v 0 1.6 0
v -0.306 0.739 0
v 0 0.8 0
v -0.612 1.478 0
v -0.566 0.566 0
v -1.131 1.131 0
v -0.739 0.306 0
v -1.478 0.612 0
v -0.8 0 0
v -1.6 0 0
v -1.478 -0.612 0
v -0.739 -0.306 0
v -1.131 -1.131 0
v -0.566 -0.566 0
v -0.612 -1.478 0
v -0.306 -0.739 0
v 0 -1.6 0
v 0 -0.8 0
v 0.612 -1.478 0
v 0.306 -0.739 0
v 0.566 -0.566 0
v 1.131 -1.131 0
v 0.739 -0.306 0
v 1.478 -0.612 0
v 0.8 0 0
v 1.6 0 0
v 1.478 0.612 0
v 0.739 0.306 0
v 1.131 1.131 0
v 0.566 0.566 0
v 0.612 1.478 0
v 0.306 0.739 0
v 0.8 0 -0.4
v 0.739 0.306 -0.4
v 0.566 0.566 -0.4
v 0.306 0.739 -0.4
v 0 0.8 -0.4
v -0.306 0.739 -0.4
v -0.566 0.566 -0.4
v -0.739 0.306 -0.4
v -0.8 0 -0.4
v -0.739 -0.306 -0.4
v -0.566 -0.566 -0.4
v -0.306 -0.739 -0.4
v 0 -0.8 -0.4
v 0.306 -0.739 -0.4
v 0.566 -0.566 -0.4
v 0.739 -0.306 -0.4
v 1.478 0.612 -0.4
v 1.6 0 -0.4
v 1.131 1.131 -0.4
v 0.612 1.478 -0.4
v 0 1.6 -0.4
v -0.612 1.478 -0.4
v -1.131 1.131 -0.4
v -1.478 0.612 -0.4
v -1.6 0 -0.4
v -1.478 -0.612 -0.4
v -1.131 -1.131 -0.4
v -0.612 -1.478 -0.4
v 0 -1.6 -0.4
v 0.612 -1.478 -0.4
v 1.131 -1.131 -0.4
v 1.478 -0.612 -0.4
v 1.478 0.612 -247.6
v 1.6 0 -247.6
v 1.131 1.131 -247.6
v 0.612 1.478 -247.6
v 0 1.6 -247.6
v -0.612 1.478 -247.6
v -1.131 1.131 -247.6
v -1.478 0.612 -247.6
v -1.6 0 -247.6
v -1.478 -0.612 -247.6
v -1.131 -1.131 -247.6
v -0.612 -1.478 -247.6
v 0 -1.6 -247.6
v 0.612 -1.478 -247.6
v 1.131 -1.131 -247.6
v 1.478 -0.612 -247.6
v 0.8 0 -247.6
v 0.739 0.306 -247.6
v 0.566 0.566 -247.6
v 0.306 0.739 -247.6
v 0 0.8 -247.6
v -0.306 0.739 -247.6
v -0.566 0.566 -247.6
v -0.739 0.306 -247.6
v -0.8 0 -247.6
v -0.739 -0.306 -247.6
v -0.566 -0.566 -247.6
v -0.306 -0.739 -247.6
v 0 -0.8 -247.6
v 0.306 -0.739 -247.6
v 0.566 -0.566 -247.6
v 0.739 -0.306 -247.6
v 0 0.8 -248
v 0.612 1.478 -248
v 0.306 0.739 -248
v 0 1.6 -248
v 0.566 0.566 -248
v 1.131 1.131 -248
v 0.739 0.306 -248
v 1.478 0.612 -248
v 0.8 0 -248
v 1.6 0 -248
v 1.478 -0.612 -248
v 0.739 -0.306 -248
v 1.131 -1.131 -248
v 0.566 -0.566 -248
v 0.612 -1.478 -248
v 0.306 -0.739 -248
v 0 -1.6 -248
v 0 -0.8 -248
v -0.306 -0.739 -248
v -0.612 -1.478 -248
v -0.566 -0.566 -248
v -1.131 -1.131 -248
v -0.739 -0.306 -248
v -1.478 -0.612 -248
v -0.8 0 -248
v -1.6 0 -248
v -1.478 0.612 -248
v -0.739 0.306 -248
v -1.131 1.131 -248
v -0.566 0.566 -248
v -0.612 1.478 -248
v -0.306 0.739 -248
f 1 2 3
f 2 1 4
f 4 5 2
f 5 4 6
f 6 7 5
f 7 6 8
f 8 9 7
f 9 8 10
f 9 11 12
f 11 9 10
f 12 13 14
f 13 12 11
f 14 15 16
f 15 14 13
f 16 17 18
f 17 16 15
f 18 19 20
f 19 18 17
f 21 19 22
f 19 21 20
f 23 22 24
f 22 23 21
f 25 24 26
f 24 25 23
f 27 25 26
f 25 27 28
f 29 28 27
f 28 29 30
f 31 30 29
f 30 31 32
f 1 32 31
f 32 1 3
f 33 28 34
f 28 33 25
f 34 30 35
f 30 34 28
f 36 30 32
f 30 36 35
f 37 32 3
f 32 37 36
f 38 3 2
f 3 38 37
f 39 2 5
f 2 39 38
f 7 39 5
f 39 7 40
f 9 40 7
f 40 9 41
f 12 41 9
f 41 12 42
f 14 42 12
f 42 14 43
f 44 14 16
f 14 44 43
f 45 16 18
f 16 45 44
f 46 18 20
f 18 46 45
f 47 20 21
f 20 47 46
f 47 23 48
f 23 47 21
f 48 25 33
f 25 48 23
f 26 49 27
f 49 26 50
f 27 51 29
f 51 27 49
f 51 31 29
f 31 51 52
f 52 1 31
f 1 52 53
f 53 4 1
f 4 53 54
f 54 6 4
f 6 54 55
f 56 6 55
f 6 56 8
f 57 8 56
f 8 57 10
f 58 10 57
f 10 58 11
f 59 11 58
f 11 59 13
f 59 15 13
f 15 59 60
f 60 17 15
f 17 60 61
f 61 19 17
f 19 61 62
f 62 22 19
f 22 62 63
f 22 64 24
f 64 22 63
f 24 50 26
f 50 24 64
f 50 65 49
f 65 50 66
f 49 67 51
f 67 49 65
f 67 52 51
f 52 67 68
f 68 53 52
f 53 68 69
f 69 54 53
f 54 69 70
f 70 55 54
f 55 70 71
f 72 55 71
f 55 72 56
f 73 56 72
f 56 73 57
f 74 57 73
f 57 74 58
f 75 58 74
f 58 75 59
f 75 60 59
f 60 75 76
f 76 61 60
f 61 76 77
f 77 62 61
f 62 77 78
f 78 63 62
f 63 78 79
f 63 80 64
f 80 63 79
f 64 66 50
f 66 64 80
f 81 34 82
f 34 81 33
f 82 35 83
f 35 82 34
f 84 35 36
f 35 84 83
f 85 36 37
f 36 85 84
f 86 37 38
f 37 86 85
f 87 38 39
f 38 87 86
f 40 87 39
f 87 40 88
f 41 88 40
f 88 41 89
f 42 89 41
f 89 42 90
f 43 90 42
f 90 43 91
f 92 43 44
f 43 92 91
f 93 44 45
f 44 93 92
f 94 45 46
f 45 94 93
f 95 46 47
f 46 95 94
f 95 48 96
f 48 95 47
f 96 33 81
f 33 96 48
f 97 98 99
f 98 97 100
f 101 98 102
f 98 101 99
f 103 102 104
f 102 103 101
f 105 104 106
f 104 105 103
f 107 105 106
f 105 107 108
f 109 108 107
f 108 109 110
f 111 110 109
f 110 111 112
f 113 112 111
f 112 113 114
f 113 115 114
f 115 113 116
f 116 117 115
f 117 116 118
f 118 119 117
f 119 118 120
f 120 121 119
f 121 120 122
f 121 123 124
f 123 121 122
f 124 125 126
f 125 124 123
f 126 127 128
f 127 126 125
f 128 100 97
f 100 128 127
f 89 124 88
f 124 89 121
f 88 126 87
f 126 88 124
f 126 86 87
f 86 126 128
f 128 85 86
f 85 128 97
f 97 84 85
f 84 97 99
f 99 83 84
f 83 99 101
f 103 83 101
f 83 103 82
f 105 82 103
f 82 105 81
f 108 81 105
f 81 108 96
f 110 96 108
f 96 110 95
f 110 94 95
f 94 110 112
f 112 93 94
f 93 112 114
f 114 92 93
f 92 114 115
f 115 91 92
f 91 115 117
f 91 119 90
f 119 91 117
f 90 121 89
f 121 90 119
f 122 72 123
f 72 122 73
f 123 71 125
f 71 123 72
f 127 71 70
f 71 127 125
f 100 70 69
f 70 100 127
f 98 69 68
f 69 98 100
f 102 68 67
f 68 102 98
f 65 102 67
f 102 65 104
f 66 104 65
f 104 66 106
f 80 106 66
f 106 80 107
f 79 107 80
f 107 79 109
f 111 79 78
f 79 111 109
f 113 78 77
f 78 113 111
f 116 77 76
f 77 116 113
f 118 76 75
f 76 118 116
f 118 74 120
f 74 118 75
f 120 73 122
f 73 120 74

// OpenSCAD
// file: ../p/4-4ring1.scad
use <../lib.scad>
function ldraw_lib__4_4ring1() = [
// 0 Ring  1 x 1.0
// 0 Name: 4-4ring1.dat
// 0 Author: James Jessiman
// 0 !LDRAW_ORG Primitive UPDATE 2009-01
// 0 !LICENSE Licensed under CC BY 2.0 and CC BY 4.0 : see CAreadme.txt
// 
// 0 BFC CERTIFY CCW
  [0,"BFC","CERTIFY"],
  [0,"BFC","CCW"],
// 
// 0 !HISTORY 1998-12-15 [PTadmin] Official Update 1998-10
// 0 !HISTORY 2002-04-08 [BrickCaster] Modified for BFC compliance
// 0 !HISTORY 2002-04-25 [PTadmin] Official Update 2002-02
// 0 !HISTORY 2007-06-24 [PTadmin] Header formatted for Contributor Agreement
// 0 !HISTORY 2008-07-01 [PTadmin] Official Update 2008-01
// 0 !HISTORY 2008-08-26 [cwdee] Switch polygon winding and rename
// 0 !HISTORY 2009-05-02 [PTadmin] Official Update 2009-01
// 
// 
// 4 16 -0.7654 0 1.8478 -0.3827 0 0.9239 0 0 1 0 0 2
  [4,16,-0.7654,0,1.8478,-0.3827,0,0.9239,0,0,1,0,0,2],
// 4 16 -1.4142 0 1.4142 -0.7071 0 0.7071 -0.3827 0 0.9239 -0.7654 0 1.8478
  [4,16,-1.4142,0,1.4142,-0.7071,0,0.7071,-0.3827,0,0.9239,-0.7654,0,1.8478],
// 4 16 -1.8478 0 0.7654 -0.9239 0 0.3827 -0.7071 0 0.7071 -1.4142 0 1.41420
  [4,16,-1.8478,0,0.7654,-0.9239,0,0.3827,-0.7071,0,0.7071,-1.4142,0,1.41420],
// 4 16 -2 0 0 -1 0 0 -0.9239 0 0.3827 -1.8478 0 0.7654
  [4,16,-2,0,0,-1,0,0,-0.9239,0,0.3827,-1.8478,0,0.7654],
// 4 16 -1.8478 0 -0.7654 -0.9239 0 -0.3827 -1 0 0 -2 0 0
  [4,16,-1.8478,0,-0.7654,-0.9239,0,-0.3827,-1,0,0,-2,0,0],
// 4 16 -1.4142 0 -1.4142 -0.7071 0 -0.7071 -0.9239 0 -0.3827 -1.8478 0 -0.7654
  [4,16,-1.4142,0,-1.4142,-0.7071,0,-0.7071,-0.9239,0,-0.3827,-1.8478,0,-0.7654],
// 4 16 -0.7654 0 -1.8478 -0.3827 0 -0.9239 -0.7071 0 -0.7071 -1.4142 0 -1.4142
  [4,16,-0.7654,0,-1.8478,-0.3827,0,-0.9239,-0.7071,0,-0.7071,-1.4142,0,-1.4142],
// 4 16 0 0 -2 0 0 -1 -0.3827 0 -0.9239 -0.7654 0 -1.8478
  [4,16,0,0,-2,0,0,-1,-0.3827,0,-0.9239,-0.7654,0,-1.8478],
// 4 16 0.7654 0 -1.8478 0.3827 0 -0.9239 0 0 -1 0 0 -2
  [4,16,0.7654,0,-1.8478,0.3827,0,-0.9239,0,0,-1,0,0,-2],
// 4 16 1.4142 0 -1.4142 0.7071 0 -0.7071 0.3827 0 -0.9239 0.7654 0 -1.8478
  [4,16,1.4142,0,-1.4142,0.7071,0,-0.7071,0.3827,0,-0.9239,0.7654,0,-1.8478],
// 4 16 1.8478 0 -0.7654 0.9239 0 -0.3827 0.7071 0 -0.7071 1.4142 0 -1.4142
  [4,16,1.8478,0,-0.7654,0.9239,0,-0.3827,0.7071,0,-0.7071,1.4142,0,-1.4142],
// 4 16 2 0 0 1 0 0 0.9239 0 -0.3827 1.8478 0 -0.7654
  [4,16,2,0,0,1,0,0,0.9239,0,-0.3827,1.8478,0,-0.7654],
// 4 16 1.8478 0 0.7654 0.9239 0 0.3827 1 0 0 2 0 0
  [4,16,1.8478,0,0.7654,0.9239,0,0.3827,1,0,0,2,0,0],
// 4 16 1.4142 0 1.4142 0.7071 0 0.7071 0.9239 0 0.3827 1.8478 0 0.7654
  [4,16,1.4142,0,1.4142,0.7071,0,0.7071,0.9239,0,0.3827,1.8478,0,0.7654],
// 4 16 0.7654 0 1.8478 0.3827 0 0.9239 0.7071 0 0.7071 1.4142 0 1.4142
  [4,16,0.7654,0,1.8478,0.3827,0,0.9239,0.7071,0,0.7071,1.4142,0,1.4142],
// 4 16 0 0 2 0 0 1 0.3827 0 0.9239 0.7654 0 1.8478
  [4,16,0,0,2,0,0,1,0.3827,0,0.9239,0.7654,0,1.8478],
// 0
];
module ldraw_lib__4_4ring1(step=0, col=false, unit=2/5, alt=false, line=0.2, solid=!$preview)
    makepoly(ldraw_lib__4_4ring1(), step=step, col=col, unit=unit, alt=alt, line=line, solid=solid);
ldraw_lib__4_4ring1(line=0.2);
// file: ../p/4-4edge.scad
use <../lib.scad>
function ldraw_lib__4_4edge() = [
// 0 Circle 1.0
// 0 Name: 4-4edge.dat
// 0 Author: James Jessiman
// 0 !LDRAW_ORG Primitive UPDATE 2017-01
// 0 !LICENSE Licensed under CC BY 4.0 : see CAreadme.txt
// 
// 0 BFC CERTIFY CCW
  [0,"BFC","CERTIFY"],
  [0,"BFC","CCW"],
// 
// 0 !HISTORY 1998-12-15 [PTadmin] Official Update 1998-10
// 0 !HISTORY 2005-12-28 [PTadmin] Official Update 2005-01
// 0 !HISTORY 2007-06-24 [PTadmin] Header formatted for Contributor Agreement
// 0 !HISTORY 2008-07-01 [PTadmin] Official Update 2008-01
// 0 !HISTORY 2017-01-15 [Steffen] BFCed
// 0 !HISTORY 2017-12-30 [PTadmin] Official Update 2017-01
// 
// 
// 2 24 1 0 0 0.9239 0 0.3827
  [2,24,1,0,0,0.9239,0,0.3827],
// 2 24 0.9239 0 0.3827 0.7071 0 0.7071
  [2,24,0.9239,0,0.3827,0.7071,0,0.7071],
// 2 24 0.7071 0 0.7071 0.3827 0 0.9239
  [2,24,0.7071,0,0.7071,0.3827,0,0.9239],
// 2 24 0.3827 0 0.9239 0 0 1
  [2,24,0.3827,0,0.9239,0,0,1],
// 2 24 0 0 1 -0.3827 0 0.9239
  [2,24,0,0,1,-0.3827,0,0.9239],
// 2 24 -0.3827 0 0.9239 -0.7071 0 0.7071
  [2,24,-0.3827,0,0.9239,-0.7071,0,0.7071],
// 2 24 -0.7071 0 0.7071 -0.9239 0 0.3827
  [2,24,-0.7071,0,0.7071,-0.9239,0,0.3827],
// 2 24 -0.9239 0 0.3827 -1 0 -0
  [2,24,-0.9239,0,0.3827,-1,0,-0],
// 2 24 -1 0 -0 -0.9239 0 -0.3827
  [2,24,-1,0,-0,-0.9239,0,-0.3827],
// 2 24 -0.9239 0 -0.3827 -0.7071 0 -0.7071
  [2,24,-0.9239,0,-0.3827,-0.7071,0,-0.7071],
// 2 24 -0.7071 0 -0.7071 -0.3827 0 -0.9239
  [2,24,-0.7071,0,-0.7071,-0.3827,0,-0.9239],
// 2 24 -0.3827 0 -0.9239 0 0 -1
  [2,24,-0.3827,0,-0.9239,0,0,-1],
// 2 24 0 0 -1 0.3827 0 -0.9239
  [2,24,0,0,-1,0.3827,0,-0.9239],
// 2 24 0.3827 0 -0.9239 0.7071 0 -0.7071
  [2,24,0.3827,0,-0.9239,0.7071,0,-0.7071],
// 2 24 0.7071 0 -0.7071 0.9239 0 -0.3827
  [2,24,0.7071,0,-0.7071,0.9239,0,-0.3827],
// 2 24 0.9239 0 -0.3827 1 0 0
  [2,24,0.9239,0,-0.3827,1,0,0],
];
module ldraw_lib__4_4edge(step=0, col=false, unit=2/5, alt=false, line=0.2, solid=!$preview)
    makepoly(ldraw_lib__4_4edge(), step=step, col=col, unit=unit, alt=alt, line=line, solid=solid);
ldraw_lib__4_4edge(line=0.2);
// file: ../p/4-4cyli.scad
use <../lib.scad>
function ldraw_lib__4_4cyli() = [
// 0 Cylinder 1.0
// 0 Name: 4-4cyli.dat
// 0 Author: James Jessiman
// 0 !LDRAW_ORG Primitive UPDATE 2005-01
// 0 !LICENSE Licensed under CC BY 2.0 and CC BY 4.0 : see CAreadme.txt
// 
// 0 BFC CERTIFY CCW
  [0,"BFC","CERTIFY"],
  [0,"BFC","CCW"],
// 
// 0 !HISTORY 1998-12-15 [PTadmin] Official Update 1998-10
// 0 !HISTORY 2002-03-23 [sbliss] Added BFC statement; merged headers from files in distributions LDraw 0.27 and Complete.
// 0 !HISTORY 2002-04-25 [PTadmin] Official Update 2002-02
// 0 !HISTORY 2004-12-14 [guyvivan] BFC CCW
// 0 !HISTORY 2005-12-28 [PTadmin] Official Update 2005-01
// 0 !HISTORY 2007-06-24 [PTadmin] Header formatted for Contributor Agreement
// 0 !HISTORY 2008-07-01 [PTadmin] Official Update 2008-01
// 
// 
// 4 16 1 1 0 0.9239 1 0.3827 0.9239 0 0.3827 1 0 0
  [4,16,1,1,0,0.9239,1,0.3827,0.9239,0,0.3827,1,0,0],
// 5 24 1 0 0 1 1 0 0.9239 0 0.3827 0.9239 0 -0.3827
  [5,24,1,0,0,1,1,0,0.9239,0,0.3827,0.9239,0,-0.3827],
// 4 16 0.9239 1 0.3827 0.7071 1 0.7071 0.7071 0 0.7071 0.9239 0 0.3827
  [4,16,0.9239,1,0.3827,0.7071,1,0.7071,0.7071,0,0.7071,0.9239,0,0.3827],
// 5 24 0.9239 0 0.3827 0.9239 1 0.3827 0.7071 0 0.7071 1 0 0
  [5,24,0.9239,0,0.3827,0.9239,1,0.3827,0.7071,0,0.7071,1,0,0],
// 4 16 0.7071 1 0.7071 0.3827 1 0.9239 0.3827 0 0.9239 0.7071 0 0.7071
  [4,16,0.7071,1,0.7071,0.3827,1,0.9239,0.3827,0,0.9239,0.7071,0,0.7071],
// 5 24 0.7071 0 0.7071 0.7071 1 0.7071 0.3827 0 0.9239 0.9239 0 0.3827
  [5,24,0.7071,0,0.7071,0.7071,1,0.7071,0.3827,0,0.9239,0.9239,0,0.3827],
// 4 16 0.3827 1 0.9239 0 1 1 0 0 1 0.3827 0 0.9239
  [4,16,0.3827,1,0.9239,0,1,1,0,0,1,0.3827,0,0.9239],
// 5 24 0.3827 0 0.9239 0.3827 1 0.9239 0 0 1 0.7071 0 0.7071
  [5,24,0.3827,0,0.9239,0.3827,1,0.9239,0,0,1,0.7071,0,0.7071],
// 4 16 0 1 1 -0.3827 1 0.9239 -0.3827 0 0.9239 0 0 1
  [4,16,0,1,1,-0.3827,1,0.9239,-0.3827,0,0.9239,0,0,1],
// 5 24 0 0 1 0 1 1 -0.3827 0 0.9239 0.3827 0 0.9239
  [5,24,0,0,1,0,1,1,-0.3827,0,0.9239,0.3827,0,0.9239],
// 4 16 -0.3827 1 0.9239 -0.7071 1 0.7071 -0.7071 0 0.7071 -0.3827 0 0.9239
  [4,16,-0.3827,1,0.9239,-0.7071,1,0.7071,-0.7071,0,0.7071,-0.3827,0,0.9239],
// 5 24 -0.3827 0 0.9239 -0.3827 1 0.9239 -0.7071 0 0.7071 0 0 1
  [5,24,-0.3827,0,0.9239,-0.3827,1,0.9239,-0.7071,0,0.7071,0,0,1],
// 4 16 -0.7071 1 0.7071 -0.9239 1 0.3827 -0.9239 0 0.3827 -0.7071 0 0.7071
  [4,16,-0.7071,1,0.7071,-0.9239,1,0.3827,-0.9239,0,0.3827,-0.7071,0,0.7071],
// 5 24 -0.7071 0 0.7071 -0.7071 1 0.7071 -0.9239 0 0.3827 -0.3827 0 0.9239
  [5,24,-0.7071,0,0.7071,-0.7071,1,0.7071,-0.9239,0,0.3827,-0.3827,0,0.9239],
// 4 16 -0.9239 1 0.3827 -1 1 0 -1 0 0 -0.9239 0 0.3827
  [4,16,-0.9239,1,0.3827,-1,1,0,-1,0,0,-0.9239,0,0.3827],
// 5 24 -0.9239 0 0.3827 -0.9239 1 0.3827 -1 0 0 -0.7071 0 0.7071
  [5,24,-0.9239,0,0.3827,-0.9239,1,0.3827,-1,0,0,-0.7071,0,0.7071],
// 4 16 -1 1 0 -0.9239 1 -0.3827 -0.9239 0 -0.3827 -1 0 0
  [4,16,-1,1,0,-0.9239,1,-0.3827,-0.9239,0,-0.3827,-1,0,0],
// 5 24 -1 0 0 -1 1 0 -0.9239 0 -0.3827 -0.9239 0 0.3827
  [5,24,-1,0,0,-1,1,0,-0.9239,0,-0.3827,-0.9239,0,0.3827],
// 4 16 -0.9239 1 -0.3827 -0.7071 1 -0.7071 -0.7071 0 -0.7071 -0.9239 0 -0.3827
  [4,16,-0.9239,1,-0.3827,-0.7071,1,-0.7071,-0.7071,0,-0.7071,-0.9239,0,-0.3827],
// 5 24 -0.9239 0 -0.3827 -0.9239 1 -0.3827 -0.7071 0 -0.7071 -1 0 0
  [5,24,-0.9239,0,-0.3827,-0.9239,1,-0.3827,-0.7071,0,-0.7071,-1,0,0],
// 4 16 -0.7071 1 -0.7071 -0.3827 1 -0.9239 -0.3827 0 -0.9239 -0.7071 0 -0.7071
  [4,16,-0.7071,1,-0.7071,-0.3827,1,-0.9239,-0.3827,0,-0.9239,-0.7071,0,-0.7071],
// 5 24 -0.7071 0 -0.7071 -0.7071 1 -0.7071 -0.3827 0 -0.9239 -0.9239 0 -0.3827
  [5,24,-0.7071,0,-0.7071,-0.7071,1,-0.7071,-0.3827,0,-0.9239,-0.9239,0,-0.3827],
// 4 16 -0.3827 1 -0.9239 0 1 -1 0 0 -1 -0.3827 0 -0.9239
  [4,16,-0.3827,1,-0.9239,0,1,-1,0,0,-1,-0.3827,0,-0.9239],
// 5 24 -0.3827 0 -0.9239 -0.3827 1 -0.9239 0 0 -1 -0.7071 0 -0.7071
  [5,24,-0.3827,0,-0.9239,-0.3827,1,-0.9239,0,0,-1,-0.7071,0,-0.7071],
// 4 16 0 1 -1 0.3827 1 -0.9239 0.3827 0 -0.9239 0 0 -1
  [4,16,0,1,-1,0.3827,1,-0.9239,0.3827,0,-0.9239,0,0,-1],
// 5 24 0 0 -1 0 1 -1 0.3827 0 -0.9239 -0.3827 0 -0.9239
  [5,24,0,0,-1,0,1,-1,0.3827,0,-0.9239,-0.3827,0,-0.9239],
// 4 16 0.3827 1 -0.9239 0.7071 1 -0.7071 0.7071 0 -0.7071 0.3827 0 -0.9239
  [4,16,0.3827,1,-0.9239,0.7071,1,-0.7071,0.7071,0,-0.7071,0.3827,0,-0.9239],
// 5 24 0.3827 0 -0.9239 0.3827 1 -0.9239 0.7071 0 -0.7071 0 0 -1
  [5,24,0.3827,0,-0.9239,0.3827,1,-0.9239,0.7071,0,-0.7071,0,0,-1],
// 4 16 0.7071 1 -0.7071 0.9239 1 -0.3827 0.9239 0 -0.3827 0.7071 0 -0.7071
  [4,16,0.7071,1,-0.7071,0.9239,1,-0.3827,0.9239,0,-0.3827,0.7071,0,-0.7071],
// 5 24 0.7071 0 -0.7071 0.7071 1 -0.7071 0.9239 0 -0.3827 0.3827 0 -0.9239
  [5,24,0.7071,0,-0.7071,0.7071,1,-0.7071,0.9239,0,-0.3827,0.3827,0,-0.9239],
// 4 16 0.9239 1 -0.3827 1 1 0 1 0 0 0.9239 0 -0.3827
  [4,16,0.9239,1,-0.3827,1,1,0,1,0,0,0.9239,0,-0.3827],
// 5 24 0.9239 0 -0.3827 0.9239 1 -0.3827 1 0 0 0.7071 0 -0.7071
  [5,24,0.9239,0,-0.3827,0.9239,1,-0.3827,1,0,0,0.7071,0,-0.7071],
// 0
];
module ldraw_lib__4_4cyli(step=0, col=false, unit=2/5, alt=false, line=0.2, solid=!$preview)
    makepoly(ldraw_lib__4_4cyli(), step=step, col=col, unit=unit, alt=alt, line=line, solid=solid);
ldraw_lib__4_4cyli(line=0.2);
// file: u9053.scad
use <../lib.scad>
use <../p/4-4cyli.scad>
use <../p/4-4edge.scad>
use <../p/4-4ring1.scad>
function ldraw_lib__u9053() = [
// 0 ~Technic Flex-System Hose End
// 0 Name: u9053.dat
// 0 Author: William Howard [WilliamH]
// 0 !LDRAW_ORG Part UPDATE 2011-02
// 0 !LICENSE Licensed under CC BY 2.0 and CC BY 4.0 : see CAreadme.txt
// 
// 0 BFC CERTIFY CCW
  [0,"BFC","CERTIFY"],
  [0,"BFC","CCW"],
// 
// 0 !HISTORY 2011-12-21 [cwdee] Reworked subparting technique
// 0 !HISTORY 2011-12-23 [PTadmin] Renamed from 76
// 0 !HISTORY 2011-12-29 [PTadmin] Official Update 2011-02
// 
// 
// 1 16 0 0 0 2 0 0 0 1 0 0 0 2 4-4ring1.dat
  [1,16,0,0,0,2,0,0,0,1,0,0,0,2, ldraw_lib__4_4ring1()],
// 1 16 0 0 0 2 0 0 0 1 0 0 0 2 4-4edge.dat
  [1,16,0,0,0,2,0,0,0,1,0,0,0,2, ldraw_lib__4_4edge()],
// 0 BFC INVERTNEXT
  [0,"BFC","INVERTNEXT"],
// 1 16 0 0 0 2 0 0 0 1 0 0 0 2 4-4cyli.dat
  [1,16,0,0,0,2,0,0,0,1,0,0,0,2, ldraw_lib__4_4cyli()],
// 1 16 0 0 0 4 0 0 0 1 0 0 0 4 4-4edge.dat
  [1,16,0,0,0,4,0,0,0,1,0,0,0,4, ldraw_lib__4_4edge()],
// 1 16 0 0 0 4 0 0 0 1 0 0 0 4 4-4cyli.dat
  [1,16,0,0,0,4,0,0,0,1,0,0,0,4, ldraw_lib__4_4cyli()],
// 0
];
module ldraw_lib__u9053(step=0, col=false, unit=2/5, alt=false, line=0.2, solid=!$preview)
    makepoly(ldraw_lib__u9053(), step=step, col=col, unit=unit, alt=alt, line=line, solid=solid);
ldraw_lib__u9053(line=0.2);
// file: 77.scad
use <../lib.scad>
use <../p/4-4cyli.scad>
function ldraw_lib__77() = [
// 0 ~Technic Flex-System Hose Segment
// 0 Name: 77.dat
// 0 Author: William Howard [WilliamH]
// 0 !LDRAW_ORG Part UPDATE 2011-02
// 0 !LICENSE Licensed under CC BY 2.0 and CC BY 4.0 : see CAreadme.txt
// 
// 0 BFC CERTIFY CCW
  [0,"BFC","CERTIFY"],
  [0,"BFC","CCW"],
// 
// 0 !HISTORY 2011-12-21 [cwdee] Reworked subparting technique
// 0 !HISTORY 2011-12-29 [PTadmin] Official Update 2011-02
// 
// 
// 1 16 0 0 0 4 0 0 0 1 0 0 0 4 4-4cyli.dat
  [1,16,0,0,0,4,0,0,0,1,0,0,0,4, ldraw_lib__4_4cyli()],
// 0 BFC INVERTNEXT
  [0,"BFC","INVERTNEXT"],
// 1 16 0 0 0 2 0 0 0 1 0 0 0 2 4-4cyli.dat
  [1,16,0,0,0,2,0,0,0,1,0,0,0,2, ldraw_lib__4_4cyli()],
// 0
];
module ldraw_lib__77(step=0, col=false, unit=2/5, alt=false, line=0.2, solid=!$preview)
    makepoly(ldraw_lib__77(), step=step, col=col, unit=unit, alt=alt, line=line, solid=solid);
ldraw_lib__77(line=0.2);
// main file
use <../lib.scad>
use <77.scad>
use <u9053.scad>
function ldraw_lib__76283() = [
// 0 Technic Flex-System Hose 31L (620LDU)
// 0 Name: 76283.dat
// 0 Author: Tim Gould [timgould]
// 0 !LDRAW_ORG Part UPDATE 2011-02
// 0 !LICENSE Licensed under CC BY 4.0 : see CAreadme.txt
// 
// 0 BFC CERTIFY CCW
  [0,"BFC","CERTIFY"],
  [0,"BFC","CCW"],
// 
// 0 !KEYWORDS bar, tube
// 
// 0 !HISTORY 2011-12-29 [PTadmin] Official Update 2011-02
// 
// 
// 1 16 0 0 0 1 0 0 0 1 0 0 0 1 u9053.dat
  [1,16,0,0,0,1,0,0,0,1,0,0,0,1, ldraw_lib__u9053()],
// 1 16 0 1 0 1 0 0 0 618 0 0 0 1 77.dat
  [1,16,0,1,0,1,0,0,0,618,0,0,0,1, ldraw_lib__77()],
// 1 16 0 620 0 -1 0 0 0 -1 0 0 0 1 u9053.dat
  [1,16,0,620,0,-1,0,0,0,-1,0,0,0,1, ldraw_lib__u9053()],
];
module ldraw_lib__76283(step=0, col=false, unit=2/5, alt=false, line=0.2, solid=!$preview)
    makepoly(ldraw_lib__76283(), step=step, col=col, unit=unit, alt=alt, line=line, solid=solid);
ldraw_lib__76283(line=0.2);
